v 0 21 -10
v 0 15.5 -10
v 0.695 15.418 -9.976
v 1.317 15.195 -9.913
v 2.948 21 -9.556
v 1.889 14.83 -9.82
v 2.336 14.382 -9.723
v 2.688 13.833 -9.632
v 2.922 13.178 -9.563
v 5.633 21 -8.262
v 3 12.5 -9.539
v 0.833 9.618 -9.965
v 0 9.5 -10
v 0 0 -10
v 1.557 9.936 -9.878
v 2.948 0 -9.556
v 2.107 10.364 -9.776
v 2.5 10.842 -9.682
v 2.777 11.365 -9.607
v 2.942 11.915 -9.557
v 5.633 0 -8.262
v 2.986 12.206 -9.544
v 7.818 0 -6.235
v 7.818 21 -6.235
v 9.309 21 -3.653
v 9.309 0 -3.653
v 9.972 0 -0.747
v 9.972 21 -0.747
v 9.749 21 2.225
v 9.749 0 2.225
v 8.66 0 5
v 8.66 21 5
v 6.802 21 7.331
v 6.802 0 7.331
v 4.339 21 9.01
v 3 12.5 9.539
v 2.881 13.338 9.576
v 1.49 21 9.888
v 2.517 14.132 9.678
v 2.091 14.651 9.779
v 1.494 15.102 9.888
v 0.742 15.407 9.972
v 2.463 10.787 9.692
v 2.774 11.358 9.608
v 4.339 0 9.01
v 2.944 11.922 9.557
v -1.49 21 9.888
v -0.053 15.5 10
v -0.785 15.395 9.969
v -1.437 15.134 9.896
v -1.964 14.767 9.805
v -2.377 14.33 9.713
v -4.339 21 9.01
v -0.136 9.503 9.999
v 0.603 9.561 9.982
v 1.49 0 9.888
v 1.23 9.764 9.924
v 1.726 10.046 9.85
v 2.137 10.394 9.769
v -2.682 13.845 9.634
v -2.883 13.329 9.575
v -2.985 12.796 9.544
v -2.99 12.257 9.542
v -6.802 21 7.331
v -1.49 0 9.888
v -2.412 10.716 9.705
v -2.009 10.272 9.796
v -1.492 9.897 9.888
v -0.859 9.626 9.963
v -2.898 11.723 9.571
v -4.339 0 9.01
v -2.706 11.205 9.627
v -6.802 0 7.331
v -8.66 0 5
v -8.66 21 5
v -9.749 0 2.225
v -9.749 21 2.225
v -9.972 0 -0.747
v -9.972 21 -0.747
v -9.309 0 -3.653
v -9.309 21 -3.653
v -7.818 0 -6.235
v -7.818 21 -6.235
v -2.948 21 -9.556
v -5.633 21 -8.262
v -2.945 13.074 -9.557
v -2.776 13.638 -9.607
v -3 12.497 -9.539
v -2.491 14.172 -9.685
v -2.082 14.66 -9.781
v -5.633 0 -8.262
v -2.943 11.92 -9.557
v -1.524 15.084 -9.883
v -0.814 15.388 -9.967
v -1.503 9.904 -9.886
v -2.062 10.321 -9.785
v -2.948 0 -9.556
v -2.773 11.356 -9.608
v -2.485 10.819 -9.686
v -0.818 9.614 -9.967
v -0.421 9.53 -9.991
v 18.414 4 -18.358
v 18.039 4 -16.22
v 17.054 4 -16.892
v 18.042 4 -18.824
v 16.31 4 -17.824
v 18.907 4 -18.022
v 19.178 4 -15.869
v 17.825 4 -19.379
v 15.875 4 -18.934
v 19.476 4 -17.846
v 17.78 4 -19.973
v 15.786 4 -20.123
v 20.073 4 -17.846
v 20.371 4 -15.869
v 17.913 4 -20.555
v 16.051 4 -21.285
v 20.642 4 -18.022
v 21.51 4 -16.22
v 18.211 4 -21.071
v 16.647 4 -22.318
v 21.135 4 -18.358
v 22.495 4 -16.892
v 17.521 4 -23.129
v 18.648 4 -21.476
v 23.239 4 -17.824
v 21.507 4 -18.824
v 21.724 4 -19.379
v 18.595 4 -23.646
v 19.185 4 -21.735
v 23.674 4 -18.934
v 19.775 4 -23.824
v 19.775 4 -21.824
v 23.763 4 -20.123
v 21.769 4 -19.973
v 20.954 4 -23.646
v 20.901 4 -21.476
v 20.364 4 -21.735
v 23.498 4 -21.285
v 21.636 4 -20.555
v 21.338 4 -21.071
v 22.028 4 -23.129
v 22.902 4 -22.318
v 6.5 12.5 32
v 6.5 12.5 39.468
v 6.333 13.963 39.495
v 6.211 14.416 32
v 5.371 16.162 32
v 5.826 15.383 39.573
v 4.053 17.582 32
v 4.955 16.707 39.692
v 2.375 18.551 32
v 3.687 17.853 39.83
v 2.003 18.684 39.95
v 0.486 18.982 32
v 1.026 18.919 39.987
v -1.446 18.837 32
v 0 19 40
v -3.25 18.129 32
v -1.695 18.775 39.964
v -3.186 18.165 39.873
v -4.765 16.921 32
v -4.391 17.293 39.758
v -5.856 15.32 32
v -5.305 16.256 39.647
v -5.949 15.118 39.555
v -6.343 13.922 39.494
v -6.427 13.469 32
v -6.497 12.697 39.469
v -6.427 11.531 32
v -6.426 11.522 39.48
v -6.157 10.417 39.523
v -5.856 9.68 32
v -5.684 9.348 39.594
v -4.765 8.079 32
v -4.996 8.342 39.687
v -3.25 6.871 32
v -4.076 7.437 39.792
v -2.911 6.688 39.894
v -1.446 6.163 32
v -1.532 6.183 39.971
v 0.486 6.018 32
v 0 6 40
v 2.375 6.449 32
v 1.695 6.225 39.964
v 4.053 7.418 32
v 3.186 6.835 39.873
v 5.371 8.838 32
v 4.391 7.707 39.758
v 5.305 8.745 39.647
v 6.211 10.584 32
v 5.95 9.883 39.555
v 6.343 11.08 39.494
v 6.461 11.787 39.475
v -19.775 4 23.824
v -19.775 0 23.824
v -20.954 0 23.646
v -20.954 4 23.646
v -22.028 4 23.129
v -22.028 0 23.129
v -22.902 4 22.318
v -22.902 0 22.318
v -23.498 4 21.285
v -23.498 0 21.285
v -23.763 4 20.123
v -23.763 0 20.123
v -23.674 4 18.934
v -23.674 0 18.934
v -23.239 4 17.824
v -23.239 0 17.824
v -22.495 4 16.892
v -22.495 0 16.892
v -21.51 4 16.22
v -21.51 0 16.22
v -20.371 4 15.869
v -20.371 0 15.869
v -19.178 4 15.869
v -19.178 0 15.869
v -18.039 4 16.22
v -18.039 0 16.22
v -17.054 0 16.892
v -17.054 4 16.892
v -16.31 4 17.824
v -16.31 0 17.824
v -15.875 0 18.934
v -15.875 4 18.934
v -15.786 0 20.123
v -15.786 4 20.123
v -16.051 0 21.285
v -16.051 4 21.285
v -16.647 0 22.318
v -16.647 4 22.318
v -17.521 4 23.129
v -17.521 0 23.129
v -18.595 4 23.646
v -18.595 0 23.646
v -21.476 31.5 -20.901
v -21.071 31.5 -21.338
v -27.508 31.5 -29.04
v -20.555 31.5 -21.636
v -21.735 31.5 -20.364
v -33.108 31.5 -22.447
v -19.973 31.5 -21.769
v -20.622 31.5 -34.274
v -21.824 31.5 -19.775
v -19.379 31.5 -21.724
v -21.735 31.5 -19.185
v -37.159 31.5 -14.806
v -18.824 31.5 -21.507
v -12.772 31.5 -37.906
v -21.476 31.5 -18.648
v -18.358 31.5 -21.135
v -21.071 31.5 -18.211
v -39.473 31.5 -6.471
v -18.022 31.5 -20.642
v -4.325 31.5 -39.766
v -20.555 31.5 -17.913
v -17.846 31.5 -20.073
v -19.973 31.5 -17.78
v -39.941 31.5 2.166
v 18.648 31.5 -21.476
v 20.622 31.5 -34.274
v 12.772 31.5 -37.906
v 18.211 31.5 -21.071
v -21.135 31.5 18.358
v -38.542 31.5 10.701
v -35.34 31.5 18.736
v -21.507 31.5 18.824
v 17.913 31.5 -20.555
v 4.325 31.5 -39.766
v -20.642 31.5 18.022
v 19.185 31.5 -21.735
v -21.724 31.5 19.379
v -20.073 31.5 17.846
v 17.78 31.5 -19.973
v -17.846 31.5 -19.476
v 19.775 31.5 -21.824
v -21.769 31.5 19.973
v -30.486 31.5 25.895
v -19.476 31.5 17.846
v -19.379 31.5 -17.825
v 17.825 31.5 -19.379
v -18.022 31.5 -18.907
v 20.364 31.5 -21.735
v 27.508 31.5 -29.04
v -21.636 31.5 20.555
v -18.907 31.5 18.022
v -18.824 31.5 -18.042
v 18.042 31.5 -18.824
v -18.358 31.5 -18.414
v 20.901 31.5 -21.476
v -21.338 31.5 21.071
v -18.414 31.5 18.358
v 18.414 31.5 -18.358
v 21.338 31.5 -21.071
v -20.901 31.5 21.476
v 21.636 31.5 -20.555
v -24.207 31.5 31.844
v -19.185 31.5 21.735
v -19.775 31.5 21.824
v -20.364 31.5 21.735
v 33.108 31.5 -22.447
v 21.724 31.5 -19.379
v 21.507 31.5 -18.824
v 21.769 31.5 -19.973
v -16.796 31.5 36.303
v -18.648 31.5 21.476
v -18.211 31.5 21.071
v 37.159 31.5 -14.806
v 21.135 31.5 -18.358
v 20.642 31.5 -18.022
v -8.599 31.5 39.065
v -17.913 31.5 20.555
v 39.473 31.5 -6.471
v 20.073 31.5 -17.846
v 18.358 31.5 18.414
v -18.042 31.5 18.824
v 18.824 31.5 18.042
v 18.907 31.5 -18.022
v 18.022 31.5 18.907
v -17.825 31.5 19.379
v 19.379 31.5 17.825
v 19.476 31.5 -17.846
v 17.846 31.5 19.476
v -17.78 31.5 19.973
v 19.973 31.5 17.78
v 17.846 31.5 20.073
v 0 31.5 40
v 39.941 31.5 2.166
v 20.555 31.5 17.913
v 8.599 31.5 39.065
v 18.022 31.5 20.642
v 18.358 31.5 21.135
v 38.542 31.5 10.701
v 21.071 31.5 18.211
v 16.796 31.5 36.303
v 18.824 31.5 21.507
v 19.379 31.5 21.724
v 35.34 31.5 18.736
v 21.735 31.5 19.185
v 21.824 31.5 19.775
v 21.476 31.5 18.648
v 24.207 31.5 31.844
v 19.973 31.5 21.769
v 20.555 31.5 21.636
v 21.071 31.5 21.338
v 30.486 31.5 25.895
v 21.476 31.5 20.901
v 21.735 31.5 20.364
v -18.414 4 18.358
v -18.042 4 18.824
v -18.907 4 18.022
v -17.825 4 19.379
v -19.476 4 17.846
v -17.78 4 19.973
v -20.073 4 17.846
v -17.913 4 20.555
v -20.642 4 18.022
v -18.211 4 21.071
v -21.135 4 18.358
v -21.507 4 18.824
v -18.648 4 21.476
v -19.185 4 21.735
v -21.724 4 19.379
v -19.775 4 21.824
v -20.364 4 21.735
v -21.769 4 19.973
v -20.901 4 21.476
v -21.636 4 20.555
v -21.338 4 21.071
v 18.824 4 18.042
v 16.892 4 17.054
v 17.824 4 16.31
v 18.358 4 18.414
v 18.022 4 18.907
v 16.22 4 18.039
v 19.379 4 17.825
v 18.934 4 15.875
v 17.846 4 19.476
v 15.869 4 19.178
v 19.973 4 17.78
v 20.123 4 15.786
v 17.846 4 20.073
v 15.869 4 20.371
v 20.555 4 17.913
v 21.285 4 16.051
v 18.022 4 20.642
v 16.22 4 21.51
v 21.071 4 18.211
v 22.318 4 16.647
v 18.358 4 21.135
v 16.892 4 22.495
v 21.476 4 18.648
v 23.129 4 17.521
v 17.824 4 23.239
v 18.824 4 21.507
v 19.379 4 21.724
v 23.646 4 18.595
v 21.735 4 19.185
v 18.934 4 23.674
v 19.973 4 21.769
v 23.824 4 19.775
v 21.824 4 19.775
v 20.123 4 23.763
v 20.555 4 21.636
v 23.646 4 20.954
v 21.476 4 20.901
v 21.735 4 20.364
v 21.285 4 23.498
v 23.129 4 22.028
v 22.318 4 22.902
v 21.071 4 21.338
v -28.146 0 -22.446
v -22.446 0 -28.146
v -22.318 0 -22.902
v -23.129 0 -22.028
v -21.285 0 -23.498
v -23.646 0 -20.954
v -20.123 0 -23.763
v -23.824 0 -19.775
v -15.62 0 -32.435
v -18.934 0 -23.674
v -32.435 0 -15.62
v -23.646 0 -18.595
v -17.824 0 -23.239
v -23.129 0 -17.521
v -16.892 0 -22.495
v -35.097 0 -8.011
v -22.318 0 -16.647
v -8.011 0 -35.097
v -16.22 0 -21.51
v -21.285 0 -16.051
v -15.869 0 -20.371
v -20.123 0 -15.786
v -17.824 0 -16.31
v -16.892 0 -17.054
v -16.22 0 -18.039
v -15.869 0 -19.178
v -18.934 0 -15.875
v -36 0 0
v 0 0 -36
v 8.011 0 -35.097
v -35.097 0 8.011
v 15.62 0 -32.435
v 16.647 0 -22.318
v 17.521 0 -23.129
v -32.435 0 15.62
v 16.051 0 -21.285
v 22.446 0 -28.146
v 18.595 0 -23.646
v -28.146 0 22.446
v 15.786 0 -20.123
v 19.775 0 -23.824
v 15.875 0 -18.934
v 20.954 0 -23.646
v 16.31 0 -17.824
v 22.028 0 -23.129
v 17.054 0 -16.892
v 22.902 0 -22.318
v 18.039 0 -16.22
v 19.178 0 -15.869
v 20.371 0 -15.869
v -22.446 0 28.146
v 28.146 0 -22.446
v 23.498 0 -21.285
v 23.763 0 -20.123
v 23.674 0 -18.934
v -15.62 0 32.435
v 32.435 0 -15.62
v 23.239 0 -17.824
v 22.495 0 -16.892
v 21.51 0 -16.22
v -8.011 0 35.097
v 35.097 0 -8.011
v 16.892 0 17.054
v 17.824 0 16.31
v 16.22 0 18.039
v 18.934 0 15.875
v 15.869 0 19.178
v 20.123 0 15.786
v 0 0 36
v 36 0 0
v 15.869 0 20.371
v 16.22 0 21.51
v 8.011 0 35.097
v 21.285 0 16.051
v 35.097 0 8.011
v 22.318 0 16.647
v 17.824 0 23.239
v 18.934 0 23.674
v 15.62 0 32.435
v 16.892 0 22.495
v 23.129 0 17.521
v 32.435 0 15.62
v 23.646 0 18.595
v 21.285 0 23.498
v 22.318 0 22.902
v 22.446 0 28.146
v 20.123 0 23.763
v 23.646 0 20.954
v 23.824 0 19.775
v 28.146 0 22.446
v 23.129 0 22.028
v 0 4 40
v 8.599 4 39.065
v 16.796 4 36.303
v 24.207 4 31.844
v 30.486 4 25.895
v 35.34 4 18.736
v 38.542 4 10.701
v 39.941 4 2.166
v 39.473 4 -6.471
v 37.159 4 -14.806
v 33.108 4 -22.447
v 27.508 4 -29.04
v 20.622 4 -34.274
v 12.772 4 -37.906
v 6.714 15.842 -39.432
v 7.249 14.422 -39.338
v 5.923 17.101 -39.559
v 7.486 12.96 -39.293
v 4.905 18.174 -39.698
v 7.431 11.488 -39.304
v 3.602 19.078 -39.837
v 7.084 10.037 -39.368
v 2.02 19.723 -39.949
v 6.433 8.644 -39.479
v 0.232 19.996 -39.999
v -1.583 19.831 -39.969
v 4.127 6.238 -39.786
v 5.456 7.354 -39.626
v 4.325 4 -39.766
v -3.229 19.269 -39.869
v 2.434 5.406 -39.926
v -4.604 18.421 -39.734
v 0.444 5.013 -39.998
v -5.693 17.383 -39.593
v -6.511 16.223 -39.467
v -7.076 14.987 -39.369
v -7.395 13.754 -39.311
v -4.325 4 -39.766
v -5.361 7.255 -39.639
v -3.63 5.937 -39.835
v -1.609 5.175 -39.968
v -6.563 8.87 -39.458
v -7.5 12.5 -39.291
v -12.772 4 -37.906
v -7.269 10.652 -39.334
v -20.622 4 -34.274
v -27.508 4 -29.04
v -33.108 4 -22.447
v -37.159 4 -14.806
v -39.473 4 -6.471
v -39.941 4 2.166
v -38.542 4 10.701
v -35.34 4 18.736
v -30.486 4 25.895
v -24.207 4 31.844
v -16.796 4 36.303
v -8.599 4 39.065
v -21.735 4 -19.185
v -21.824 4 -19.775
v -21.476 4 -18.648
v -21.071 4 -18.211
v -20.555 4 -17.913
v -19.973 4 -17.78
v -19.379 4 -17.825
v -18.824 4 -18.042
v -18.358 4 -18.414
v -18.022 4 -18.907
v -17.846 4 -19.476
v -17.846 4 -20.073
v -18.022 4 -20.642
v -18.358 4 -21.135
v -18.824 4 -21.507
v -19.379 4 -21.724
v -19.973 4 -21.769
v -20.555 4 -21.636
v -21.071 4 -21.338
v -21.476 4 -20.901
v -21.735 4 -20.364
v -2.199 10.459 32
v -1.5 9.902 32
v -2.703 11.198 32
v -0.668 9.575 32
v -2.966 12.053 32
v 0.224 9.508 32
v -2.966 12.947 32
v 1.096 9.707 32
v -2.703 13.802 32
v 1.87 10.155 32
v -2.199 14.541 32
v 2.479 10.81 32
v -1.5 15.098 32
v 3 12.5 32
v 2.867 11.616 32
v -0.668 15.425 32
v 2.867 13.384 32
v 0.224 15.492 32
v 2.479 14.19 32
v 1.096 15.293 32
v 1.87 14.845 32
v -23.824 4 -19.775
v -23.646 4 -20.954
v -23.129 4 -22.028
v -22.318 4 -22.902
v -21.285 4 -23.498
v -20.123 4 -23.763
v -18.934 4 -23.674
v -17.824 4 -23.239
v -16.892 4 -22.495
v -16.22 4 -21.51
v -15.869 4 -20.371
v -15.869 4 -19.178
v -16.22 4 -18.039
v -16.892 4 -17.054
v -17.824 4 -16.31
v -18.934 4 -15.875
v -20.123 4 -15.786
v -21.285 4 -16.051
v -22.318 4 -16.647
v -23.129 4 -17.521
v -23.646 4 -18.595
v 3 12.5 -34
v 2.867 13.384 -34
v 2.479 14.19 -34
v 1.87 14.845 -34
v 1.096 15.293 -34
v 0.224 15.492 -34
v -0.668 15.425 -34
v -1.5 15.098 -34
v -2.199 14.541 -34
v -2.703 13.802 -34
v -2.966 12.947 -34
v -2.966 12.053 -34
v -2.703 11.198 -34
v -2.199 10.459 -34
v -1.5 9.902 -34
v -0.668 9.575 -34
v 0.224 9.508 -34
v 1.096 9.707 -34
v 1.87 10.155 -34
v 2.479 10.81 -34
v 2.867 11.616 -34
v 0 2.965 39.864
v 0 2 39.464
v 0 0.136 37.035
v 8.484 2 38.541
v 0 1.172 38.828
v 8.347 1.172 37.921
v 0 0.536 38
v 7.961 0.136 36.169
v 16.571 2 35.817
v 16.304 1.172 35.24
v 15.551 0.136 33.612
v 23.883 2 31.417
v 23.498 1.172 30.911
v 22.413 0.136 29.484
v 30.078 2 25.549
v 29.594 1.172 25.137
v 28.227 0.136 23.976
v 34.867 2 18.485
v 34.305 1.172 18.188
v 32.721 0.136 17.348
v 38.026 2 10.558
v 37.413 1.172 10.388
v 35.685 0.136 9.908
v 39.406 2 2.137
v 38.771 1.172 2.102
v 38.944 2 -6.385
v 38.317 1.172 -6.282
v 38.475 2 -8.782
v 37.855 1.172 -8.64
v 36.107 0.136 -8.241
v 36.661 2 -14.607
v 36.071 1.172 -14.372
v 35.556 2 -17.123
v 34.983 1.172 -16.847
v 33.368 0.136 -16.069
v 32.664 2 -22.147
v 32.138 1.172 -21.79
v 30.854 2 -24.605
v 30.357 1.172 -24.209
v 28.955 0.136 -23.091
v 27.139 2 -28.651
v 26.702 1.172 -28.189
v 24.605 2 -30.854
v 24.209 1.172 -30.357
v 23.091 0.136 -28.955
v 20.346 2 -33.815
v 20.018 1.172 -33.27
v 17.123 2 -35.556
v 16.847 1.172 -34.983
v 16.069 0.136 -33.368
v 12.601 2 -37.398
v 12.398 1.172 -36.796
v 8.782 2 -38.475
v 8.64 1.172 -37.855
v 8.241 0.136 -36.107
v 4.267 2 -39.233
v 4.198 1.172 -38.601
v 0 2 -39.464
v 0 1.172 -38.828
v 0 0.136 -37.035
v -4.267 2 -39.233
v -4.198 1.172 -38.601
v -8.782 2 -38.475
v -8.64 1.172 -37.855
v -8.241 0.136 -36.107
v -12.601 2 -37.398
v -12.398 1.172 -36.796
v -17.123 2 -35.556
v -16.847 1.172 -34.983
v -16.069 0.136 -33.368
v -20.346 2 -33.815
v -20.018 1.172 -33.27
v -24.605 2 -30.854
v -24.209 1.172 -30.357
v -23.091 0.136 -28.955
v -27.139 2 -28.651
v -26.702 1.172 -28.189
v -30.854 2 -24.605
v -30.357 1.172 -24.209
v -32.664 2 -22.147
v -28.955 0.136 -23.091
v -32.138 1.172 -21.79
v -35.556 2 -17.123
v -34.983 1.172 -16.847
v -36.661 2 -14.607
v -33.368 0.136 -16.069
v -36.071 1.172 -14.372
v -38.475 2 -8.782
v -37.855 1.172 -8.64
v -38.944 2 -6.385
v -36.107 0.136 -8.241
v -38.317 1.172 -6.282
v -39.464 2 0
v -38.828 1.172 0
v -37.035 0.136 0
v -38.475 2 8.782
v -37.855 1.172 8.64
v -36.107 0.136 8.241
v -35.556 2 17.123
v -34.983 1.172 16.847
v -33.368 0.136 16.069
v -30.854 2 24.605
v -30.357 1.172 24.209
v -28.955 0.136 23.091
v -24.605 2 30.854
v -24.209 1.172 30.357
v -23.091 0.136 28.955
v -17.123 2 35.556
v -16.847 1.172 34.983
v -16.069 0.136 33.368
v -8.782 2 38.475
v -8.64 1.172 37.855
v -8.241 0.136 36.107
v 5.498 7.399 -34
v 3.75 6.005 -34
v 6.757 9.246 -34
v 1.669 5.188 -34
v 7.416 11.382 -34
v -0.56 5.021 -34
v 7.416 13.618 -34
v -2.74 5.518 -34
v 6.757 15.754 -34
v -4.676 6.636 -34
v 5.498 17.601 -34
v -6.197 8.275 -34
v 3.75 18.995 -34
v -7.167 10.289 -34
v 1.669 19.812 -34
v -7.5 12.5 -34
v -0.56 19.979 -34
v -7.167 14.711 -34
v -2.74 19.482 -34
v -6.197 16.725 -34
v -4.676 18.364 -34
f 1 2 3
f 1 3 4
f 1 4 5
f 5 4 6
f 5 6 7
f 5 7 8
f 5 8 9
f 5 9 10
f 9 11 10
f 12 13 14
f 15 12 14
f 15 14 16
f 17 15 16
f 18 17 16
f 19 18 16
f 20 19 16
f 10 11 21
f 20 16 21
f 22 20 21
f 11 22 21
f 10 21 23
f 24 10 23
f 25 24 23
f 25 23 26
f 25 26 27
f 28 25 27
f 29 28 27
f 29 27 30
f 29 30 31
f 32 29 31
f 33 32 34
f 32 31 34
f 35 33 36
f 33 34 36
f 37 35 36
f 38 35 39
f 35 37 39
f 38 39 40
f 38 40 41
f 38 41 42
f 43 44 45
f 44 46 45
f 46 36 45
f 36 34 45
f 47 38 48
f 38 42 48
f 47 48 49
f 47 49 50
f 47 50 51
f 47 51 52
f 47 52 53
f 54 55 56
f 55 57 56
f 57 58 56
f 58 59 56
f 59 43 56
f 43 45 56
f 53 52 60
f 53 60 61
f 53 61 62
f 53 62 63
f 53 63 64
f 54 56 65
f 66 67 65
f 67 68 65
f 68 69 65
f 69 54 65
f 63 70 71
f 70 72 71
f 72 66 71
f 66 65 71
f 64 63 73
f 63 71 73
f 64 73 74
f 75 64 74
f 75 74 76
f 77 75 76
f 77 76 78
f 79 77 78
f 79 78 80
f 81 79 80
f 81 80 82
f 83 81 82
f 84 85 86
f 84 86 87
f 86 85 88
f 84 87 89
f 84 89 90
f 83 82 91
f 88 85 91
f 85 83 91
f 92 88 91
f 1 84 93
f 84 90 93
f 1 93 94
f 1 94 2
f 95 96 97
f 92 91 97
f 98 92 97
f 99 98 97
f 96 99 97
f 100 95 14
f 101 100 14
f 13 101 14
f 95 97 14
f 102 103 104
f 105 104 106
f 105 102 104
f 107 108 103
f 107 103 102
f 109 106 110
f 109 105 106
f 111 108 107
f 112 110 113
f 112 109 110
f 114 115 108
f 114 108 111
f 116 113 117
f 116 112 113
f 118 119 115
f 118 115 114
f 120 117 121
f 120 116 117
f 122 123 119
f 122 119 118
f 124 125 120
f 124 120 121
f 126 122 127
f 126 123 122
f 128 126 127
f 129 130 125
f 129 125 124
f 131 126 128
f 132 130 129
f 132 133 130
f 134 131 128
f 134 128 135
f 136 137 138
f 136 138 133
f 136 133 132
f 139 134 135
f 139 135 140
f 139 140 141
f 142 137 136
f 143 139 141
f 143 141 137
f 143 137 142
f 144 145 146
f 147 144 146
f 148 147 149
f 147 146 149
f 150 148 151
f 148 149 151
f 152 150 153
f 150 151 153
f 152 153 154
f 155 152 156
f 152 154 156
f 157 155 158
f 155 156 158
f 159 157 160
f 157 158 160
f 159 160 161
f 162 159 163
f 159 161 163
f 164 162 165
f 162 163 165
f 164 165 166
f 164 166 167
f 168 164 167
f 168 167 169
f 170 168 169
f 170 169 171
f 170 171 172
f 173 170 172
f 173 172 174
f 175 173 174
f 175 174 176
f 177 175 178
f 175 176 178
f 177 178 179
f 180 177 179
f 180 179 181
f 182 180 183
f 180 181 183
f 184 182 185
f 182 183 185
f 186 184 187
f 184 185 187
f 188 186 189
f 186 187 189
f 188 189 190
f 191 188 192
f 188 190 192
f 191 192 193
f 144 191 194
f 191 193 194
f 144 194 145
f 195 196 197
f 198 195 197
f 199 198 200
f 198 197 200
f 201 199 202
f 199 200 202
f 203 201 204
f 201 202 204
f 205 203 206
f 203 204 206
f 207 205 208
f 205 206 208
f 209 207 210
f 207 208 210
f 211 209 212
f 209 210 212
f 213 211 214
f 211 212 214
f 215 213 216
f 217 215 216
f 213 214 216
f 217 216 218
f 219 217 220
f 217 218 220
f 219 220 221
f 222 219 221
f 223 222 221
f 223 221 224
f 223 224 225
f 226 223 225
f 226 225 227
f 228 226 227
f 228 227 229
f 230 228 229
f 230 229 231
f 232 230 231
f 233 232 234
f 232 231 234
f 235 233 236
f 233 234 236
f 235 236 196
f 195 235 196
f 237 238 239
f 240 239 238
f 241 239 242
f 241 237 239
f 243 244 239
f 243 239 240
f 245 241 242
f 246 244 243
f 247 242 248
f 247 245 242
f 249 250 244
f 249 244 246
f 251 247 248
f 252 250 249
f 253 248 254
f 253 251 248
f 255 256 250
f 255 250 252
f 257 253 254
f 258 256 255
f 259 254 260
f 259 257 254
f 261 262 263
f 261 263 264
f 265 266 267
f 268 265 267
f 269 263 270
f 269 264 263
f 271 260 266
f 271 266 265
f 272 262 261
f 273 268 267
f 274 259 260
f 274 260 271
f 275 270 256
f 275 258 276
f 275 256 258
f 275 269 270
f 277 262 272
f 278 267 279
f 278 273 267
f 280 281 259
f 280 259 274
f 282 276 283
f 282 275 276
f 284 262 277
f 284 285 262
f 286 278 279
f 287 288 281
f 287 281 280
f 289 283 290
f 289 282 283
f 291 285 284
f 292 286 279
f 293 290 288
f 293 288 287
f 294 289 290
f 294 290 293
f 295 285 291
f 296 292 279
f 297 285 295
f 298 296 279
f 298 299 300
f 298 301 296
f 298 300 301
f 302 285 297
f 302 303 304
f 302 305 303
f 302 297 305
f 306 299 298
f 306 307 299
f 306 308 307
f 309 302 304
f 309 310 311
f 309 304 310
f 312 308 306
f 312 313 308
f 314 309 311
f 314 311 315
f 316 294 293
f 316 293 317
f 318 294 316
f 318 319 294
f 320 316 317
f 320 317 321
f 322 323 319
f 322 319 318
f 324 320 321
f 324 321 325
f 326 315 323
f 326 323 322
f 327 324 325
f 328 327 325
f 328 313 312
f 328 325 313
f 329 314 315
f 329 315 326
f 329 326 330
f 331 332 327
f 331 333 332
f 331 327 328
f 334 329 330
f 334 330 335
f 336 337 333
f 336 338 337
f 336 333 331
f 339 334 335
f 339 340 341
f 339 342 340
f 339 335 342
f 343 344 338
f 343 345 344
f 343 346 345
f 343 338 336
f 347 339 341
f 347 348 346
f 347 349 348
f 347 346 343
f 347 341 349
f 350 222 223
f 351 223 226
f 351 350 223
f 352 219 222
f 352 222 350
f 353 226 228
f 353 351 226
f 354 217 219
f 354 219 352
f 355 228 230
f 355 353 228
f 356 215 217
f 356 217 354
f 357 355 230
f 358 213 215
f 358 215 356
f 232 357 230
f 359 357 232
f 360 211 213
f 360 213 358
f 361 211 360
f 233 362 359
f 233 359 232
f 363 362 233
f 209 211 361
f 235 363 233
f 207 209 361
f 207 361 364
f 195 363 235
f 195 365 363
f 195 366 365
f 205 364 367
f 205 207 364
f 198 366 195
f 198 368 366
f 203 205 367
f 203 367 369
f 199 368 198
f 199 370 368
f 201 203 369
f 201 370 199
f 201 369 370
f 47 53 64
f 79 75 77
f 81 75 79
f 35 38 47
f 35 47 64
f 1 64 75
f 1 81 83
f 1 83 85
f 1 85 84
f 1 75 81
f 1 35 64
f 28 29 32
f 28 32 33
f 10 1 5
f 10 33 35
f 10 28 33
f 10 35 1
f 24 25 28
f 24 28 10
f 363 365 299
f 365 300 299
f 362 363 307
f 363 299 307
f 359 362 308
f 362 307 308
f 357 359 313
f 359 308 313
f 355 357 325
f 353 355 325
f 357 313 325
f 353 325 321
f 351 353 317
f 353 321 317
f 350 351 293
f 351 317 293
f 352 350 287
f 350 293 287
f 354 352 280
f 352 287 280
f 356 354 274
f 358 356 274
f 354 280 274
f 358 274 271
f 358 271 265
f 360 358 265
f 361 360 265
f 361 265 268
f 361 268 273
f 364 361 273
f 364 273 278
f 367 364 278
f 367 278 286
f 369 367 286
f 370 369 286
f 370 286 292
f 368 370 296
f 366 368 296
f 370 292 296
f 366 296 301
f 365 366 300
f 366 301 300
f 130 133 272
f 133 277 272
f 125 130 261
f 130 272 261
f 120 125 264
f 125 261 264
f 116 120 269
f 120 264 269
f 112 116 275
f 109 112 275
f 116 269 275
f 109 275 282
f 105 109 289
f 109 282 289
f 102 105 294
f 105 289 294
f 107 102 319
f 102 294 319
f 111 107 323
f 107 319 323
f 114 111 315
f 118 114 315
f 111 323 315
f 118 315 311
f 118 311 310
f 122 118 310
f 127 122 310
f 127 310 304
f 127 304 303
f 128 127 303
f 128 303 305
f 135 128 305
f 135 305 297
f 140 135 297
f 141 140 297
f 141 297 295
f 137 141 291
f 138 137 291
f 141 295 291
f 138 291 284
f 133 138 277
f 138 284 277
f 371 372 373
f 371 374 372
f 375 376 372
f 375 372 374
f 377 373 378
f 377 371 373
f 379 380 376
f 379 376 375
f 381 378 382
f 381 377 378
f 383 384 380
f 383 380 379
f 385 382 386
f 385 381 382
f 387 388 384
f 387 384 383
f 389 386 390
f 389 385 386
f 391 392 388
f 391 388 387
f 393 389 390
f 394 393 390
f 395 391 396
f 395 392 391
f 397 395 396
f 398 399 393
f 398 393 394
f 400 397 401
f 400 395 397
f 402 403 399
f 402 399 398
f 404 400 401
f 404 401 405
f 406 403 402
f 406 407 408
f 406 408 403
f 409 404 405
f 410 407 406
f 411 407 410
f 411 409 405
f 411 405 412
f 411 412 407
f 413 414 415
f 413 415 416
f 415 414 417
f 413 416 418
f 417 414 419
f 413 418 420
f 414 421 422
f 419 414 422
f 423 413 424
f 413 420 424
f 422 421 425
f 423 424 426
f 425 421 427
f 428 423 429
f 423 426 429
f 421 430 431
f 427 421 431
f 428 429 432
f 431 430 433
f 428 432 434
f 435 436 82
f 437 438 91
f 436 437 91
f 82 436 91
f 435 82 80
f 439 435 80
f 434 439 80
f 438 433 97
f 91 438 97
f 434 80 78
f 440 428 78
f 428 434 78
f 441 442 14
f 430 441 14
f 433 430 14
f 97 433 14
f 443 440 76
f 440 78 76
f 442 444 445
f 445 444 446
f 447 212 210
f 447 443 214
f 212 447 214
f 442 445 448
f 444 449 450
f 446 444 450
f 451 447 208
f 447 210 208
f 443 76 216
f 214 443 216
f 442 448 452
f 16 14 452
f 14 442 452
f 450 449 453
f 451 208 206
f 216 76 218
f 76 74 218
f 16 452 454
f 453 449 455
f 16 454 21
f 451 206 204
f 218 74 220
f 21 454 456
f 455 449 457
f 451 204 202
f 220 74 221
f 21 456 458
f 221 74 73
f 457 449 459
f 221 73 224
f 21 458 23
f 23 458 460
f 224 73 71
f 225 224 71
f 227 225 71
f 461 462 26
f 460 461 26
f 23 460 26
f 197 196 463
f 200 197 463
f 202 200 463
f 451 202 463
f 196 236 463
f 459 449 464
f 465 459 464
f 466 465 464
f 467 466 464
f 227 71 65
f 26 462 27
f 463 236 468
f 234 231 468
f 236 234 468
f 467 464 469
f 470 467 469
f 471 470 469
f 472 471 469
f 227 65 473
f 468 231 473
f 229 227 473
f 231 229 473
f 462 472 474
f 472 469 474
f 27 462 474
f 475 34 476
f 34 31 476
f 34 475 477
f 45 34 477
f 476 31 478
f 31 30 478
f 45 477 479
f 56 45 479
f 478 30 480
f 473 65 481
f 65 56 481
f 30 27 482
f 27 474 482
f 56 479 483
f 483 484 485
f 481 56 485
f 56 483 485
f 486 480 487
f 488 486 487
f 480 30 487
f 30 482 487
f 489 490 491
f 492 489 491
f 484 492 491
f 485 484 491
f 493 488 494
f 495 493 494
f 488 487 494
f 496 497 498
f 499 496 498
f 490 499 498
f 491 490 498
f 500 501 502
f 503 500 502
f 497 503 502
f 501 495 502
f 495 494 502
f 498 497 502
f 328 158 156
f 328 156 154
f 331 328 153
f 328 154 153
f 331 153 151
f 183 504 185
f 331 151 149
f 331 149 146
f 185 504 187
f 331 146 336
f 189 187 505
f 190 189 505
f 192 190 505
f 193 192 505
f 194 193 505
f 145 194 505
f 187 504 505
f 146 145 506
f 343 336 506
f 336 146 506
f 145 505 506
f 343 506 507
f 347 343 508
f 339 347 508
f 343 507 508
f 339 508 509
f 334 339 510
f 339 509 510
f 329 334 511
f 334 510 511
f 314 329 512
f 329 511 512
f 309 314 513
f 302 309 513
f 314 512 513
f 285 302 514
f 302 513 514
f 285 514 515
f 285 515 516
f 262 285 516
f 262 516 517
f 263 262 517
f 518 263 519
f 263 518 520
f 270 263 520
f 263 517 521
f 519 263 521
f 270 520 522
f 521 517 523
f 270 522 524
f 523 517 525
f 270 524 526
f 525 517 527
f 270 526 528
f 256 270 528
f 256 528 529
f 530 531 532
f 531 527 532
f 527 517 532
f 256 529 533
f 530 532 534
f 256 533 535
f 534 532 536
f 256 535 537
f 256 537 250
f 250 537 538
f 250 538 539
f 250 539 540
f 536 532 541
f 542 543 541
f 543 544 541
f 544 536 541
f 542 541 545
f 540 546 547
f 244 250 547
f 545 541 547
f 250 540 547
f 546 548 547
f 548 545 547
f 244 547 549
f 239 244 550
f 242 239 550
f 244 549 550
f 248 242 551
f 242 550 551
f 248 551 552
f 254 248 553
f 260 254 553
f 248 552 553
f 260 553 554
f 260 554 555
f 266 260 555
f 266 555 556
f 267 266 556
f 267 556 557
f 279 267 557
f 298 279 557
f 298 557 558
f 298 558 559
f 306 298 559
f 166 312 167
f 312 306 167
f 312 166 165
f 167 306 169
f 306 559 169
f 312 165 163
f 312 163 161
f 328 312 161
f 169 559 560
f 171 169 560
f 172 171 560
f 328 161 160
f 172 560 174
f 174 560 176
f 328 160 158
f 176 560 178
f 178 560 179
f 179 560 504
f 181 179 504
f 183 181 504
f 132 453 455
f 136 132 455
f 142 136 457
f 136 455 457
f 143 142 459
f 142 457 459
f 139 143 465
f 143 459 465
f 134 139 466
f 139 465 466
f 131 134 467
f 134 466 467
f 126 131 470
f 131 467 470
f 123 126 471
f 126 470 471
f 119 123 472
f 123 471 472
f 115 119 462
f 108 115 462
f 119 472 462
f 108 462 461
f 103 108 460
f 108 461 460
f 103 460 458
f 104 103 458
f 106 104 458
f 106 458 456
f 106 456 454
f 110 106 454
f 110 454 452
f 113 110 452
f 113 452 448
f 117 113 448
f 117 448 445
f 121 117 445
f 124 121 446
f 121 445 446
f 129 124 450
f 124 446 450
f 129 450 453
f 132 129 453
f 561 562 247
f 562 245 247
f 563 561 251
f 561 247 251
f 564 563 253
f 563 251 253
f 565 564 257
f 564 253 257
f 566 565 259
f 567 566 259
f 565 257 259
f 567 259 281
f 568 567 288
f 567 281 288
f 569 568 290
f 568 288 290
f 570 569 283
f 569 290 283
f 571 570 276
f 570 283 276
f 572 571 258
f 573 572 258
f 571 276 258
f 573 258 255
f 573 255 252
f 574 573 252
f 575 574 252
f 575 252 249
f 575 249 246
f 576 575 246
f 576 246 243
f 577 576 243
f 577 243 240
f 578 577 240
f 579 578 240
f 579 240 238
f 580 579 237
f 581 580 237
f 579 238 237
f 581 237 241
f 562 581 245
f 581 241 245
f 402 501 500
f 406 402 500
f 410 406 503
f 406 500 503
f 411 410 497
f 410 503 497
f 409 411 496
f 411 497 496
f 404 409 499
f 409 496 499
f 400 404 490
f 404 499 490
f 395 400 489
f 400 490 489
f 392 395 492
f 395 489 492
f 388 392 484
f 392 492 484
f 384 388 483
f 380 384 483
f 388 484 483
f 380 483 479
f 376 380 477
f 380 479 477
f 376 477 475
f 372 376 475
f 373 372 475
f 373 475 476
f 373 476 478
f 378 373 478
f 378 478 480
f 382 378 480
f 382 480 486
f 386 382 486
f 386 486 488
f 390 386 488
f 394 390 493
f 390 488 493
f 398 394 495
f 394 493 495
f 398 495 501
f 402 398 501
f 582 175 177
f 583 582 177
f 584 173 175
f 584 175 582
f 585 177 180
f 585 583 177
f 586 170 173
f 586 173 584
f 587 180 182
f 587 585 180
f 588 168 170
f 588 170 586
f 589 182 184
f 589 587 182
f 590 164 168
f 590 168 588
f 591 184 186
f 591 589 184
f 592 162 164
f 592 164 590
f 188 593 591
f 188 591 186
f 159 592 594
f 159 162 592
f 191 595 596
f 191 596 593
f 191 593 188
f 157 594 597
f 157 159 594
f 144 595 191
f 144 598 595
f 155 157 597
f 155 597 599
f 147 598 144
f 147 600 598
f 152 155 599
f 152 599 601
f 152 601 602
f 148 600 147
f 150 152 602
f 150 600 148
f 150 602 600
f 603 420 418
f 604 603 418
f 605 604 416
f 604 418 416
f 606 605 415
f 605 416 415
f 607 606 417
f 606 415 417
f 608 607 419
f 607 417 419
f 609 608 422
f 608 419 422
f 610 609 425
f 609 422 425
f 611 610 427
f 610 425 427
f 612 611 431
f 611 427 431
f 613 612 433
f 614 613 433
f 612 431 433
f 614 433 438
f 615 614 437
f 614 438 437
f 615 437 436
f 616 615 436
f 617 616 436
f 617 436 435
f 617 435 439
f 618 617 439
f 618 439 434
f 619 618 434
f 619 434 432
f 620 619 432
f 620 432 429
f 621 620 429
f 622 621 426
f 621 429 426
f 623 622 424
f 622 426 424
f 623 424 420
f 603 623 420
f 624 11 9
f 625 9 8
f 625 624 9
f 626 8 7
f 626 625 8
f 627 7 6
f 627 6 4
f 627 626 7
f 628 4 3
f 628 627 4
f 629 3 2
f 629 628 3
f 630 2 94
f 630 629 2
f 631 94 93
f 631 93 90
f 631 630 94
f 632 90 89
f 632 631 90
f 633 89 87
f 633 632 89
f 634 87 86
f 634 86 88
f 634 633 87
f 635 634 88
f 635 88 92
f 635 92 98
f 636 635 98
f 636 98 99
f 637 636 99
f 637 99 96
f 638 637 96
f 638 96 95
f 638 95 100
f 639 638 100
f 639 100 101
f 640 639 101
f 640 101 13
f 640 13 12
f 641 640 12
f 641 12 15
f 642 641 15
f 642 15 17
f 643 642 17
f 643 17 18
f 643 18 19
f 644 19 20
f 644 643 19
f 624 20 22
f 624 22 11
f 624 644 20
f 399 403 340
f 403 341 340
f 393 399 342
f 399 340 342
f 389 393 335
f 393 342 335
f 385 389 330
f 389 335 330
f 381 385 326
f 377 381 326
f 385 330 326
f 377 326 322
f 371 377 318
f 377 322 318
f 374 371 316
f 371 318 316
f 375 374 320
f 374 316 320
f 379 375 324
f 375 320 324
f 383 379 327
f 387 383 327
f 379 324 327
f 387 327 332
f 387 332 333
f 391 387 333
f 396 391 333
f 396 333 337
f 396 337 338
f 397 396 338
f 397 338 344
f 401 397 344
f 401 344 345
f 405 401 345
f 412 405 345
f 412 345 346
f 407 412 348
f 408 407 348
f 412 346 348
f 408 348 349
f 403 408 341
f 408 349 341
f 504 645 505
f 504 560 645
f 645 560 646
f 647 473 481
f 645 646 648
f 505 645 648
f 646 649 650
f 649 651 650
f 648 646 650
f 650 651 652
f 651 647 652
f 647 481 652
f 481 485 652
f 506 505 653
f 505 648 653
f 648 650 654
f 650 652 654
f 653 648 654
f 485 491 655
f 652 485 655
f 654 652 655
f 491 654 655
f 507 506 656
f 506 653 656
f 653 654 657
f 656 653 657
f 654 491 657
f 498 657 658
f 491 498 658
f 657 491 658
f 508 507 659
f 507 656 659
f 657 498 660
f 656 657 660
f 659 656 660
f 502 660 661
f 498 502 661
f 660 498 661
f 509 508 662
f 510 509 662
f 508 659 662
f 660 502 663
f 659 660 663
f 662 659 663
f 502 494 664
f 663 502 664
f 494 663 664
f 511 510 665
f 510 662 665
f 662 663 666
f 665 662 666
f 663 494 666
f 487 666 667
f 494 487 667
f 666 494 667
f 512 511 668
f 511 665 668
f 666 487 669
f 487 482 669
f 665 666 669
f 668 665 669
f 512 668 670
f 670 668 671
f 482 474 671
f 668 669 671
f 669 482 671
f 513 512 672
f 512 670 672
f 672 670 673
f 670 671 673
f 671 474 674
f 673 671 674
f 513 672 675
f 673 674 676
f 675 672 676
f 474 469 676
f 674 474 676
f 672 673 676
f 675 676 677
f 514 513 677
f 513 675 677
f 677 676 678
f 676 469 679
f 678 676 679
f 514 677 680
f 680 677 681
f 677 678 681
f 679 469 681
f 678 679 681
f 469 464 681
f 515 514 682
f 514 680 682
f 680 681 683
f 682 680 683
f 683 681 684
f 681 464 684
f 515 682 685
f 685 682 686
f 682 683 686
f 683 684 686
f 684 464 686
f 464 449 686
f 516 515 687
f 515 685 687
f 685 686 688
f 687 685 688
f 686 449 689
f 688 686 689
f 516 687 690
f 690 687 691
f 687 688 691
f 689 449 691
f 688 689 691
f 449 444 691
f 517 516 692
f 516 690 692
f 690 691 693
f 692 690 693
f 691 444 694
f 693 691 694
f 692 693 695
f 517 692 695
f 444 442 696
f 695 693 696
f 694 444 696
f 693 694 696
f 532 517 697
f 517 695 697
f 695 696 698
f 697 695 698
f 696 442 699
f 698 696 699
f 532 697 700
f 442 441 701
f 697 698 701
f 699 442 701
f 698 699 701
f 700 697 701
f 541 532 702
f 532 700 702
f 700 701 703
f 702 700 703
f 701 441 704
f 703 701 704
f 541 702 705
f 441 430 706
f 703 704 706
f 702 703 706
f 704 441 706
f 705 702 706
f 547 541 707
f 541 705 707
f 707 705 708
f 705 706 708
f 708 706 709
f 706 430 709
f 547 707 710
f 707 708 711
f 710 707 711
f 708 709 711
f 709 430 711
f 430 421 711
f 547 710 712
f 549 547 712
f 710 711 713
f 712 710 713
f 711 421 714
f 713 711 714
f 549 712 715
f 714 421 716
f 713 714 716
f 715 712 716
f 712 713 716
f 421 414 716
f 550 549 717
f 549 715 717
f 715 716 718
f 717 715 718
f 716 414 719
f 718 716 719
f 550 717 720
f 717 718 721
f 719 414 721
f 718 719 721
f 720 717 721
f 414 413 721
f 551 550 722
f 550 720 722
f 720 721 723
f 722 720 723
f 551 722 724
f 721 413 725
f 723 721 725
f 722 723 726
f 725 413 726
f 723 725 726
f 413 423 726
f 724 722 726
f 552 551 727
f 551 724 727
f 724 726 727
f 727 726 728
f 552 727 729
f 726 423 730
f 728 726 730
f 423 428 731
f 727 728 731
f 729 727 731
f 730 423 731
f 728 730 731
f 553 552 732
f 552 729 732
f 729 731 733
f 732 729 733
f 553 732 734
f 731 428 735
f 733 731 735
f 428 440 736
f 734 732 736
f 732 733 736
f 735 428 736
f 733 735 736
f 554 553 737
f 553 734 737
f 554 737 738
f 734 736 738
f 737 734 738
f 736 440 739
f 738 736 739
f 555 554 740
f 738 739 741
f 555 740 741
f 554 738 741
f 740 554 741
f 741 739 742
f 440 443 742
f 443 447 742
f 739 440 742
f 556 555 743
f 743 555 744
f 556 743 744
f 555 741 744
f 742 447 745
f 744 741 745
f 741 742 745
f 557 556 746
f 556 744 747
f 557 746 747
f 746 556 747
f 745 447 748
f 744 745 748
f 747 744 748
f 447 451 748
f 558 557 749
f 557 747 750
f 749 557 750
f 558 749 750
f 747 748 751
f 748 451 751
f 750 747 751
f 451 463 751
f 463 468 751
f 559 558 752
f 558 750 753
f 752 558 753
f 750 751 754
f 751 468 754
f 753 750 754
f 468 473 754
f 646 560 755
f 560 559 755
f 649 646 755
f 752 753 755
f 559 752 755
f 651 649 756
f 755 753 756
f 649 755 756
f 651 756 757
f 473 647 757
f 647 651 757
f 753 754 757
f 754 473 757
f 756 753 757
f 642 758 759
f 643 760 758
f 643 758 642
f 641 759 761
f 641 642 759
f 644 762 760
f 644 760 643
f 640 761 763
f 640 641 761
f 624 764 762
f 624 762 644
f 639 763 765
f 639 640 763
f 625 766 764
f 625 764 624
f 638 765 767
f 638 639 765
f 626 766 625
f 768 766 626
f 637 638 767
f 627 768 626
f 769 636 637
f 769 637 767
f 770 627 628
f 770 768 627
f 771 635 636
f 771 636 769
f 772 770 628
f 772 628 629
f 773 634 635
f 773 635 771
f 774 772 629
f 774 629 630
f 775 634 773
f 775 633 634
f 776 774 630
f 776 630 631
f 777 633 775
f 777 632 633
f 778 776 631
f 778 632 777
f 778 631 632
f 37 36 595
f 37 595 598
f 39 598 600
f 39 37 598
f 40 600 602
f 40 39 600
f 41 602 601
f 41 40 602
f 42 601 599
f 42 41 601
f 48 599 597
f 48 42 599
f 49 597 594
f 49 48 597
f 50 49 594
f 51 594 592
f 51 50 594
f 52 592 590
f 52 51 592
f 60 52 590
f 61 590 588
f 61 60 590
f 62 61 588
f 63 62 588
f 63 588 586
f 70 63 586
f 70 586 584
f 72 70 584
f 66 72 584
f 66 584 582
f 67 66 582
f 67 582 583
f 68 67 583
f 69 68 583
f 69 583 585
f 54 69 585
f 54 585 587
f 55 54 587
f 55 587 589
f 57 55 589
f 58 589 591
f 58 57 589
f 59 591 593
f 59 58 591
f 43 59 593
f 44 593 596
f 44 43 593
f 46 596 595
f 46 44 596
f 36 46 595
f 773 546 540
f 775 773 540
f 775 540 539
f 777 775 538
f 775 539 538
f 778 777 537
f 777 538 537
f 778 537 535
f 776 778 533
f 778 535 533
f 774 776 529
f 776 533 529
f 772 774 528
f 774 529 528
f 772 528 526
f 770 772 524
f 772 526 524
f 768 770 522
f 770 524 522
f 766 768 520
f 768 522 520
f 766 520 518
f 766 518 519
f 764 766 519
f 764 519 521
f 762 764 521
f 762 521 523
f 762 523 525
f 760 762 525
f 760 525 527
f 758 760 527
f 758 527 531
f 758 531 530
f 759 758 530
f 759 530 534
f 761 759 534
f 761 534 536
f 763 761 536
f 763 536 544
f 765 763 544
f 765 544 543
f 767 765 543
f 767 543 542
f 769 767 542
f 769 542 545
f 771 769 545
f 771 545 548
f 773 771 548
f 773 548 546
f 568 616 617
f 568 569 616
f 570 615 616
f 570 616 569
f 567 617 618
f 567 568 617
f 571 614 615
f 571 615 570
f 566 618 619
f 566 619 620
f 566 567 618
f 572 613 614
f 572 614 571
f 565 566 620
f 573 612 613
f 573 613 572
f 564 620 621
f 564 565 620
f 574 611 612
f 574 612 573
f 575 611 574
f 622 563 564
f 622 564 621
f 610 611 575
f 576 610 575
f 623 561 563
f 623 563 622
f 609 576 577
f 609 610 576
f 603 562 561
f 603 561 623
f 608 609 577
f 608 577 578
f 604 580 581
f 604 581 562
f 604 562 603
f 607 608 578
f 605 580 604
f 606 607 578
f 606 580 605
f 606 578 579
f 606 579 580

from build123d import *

# Parameters (mm, degrees)
SKETCH1_R               = 40
BOSS_EXTRUDE1_DEPTH     = 31.5
CUT_EXTRUDE1_DEPTH      = 65.747586828
CUT_EXTRUDE1_DEPTH_BACK = 65.747586828
SKETCH2_R               = 3
SKETCH7_R               = 10
CUT_EXTRUDE3_DEPTH      = 21
SKETCH8_R               = 6.5
CUT_EXTRUDE4_DEPTH      = 8
SKETCH9_R               = 7.5
CUT_EXTRUDE5_DEPTH      = 6
SKETCH10_R              = 2
CUT_EXTRUDE7_DEPTH      = 65.747587
CIRPATTERN1_COUNT       = 4
SKETCH12_R              = 4
CUT_EXTRUDE8_DEPTH      = 4
CIRPATTERN2_COUNT       = 4
FILLET1_R               = 4


with BuildPart() as part:
    # Sketch1 → Boss-Extrude1 (new body)
    with BuildSketch(Plane(origin=(0, 0, 0), x_dir=(1, 0, 0), z_dir=(0, 1, 0))):
        with Locations(Location((0, 0, 0), (0, 0, 270))):
            Circle(SKETCH1_R)
    extrude(amount=BOSS_EXTRUDE1_DEPTH)

    # Sketch2 → Cut-Extrude1 (cut, two sides: drawn at the far end of the back side and taken through both)
    with BuildSketch(Plane.XY.offset(-CUT_EXTRUDE1_DEPTH_BACK)):
        with Locations((0, 12.5)):
            Circle(SKETCH2_R)
    extrude(amount=CUT_EXTRUDE1_DEPTH + CUT_EXTRUDE1_DEPTH_BACK, mode=Mode.SUBTRACT)

    # Sketch7 → Cut-Extrude3 (cut)
    with BuildSketch(Plane.XZ):
        with Locations(Location((0, 0, 0), (0, 0, 270))):
            Circle(SKETCH7_R)
    extrude(amount=-CUT_EXTRUDE3_DEPTH, mode=Mode.SUBTRACT)

    # Sketch8 → Cut-Extrude4 (cut)
    with BuildSketch(Plane.XY.offset(40)):
        with Locations((0, 12.5)):
            Circle(SKETCH8_R)
    extrude(amount=-CUT_EXTRUDE4_DEPTH, mode=Mode.SUBTRACT)

    # Sketch9 → Cut-Extrude5 (cut)
    with BuildSketch(Plane(origin=(0, 0, -40), x_dir=(-1, 0, 0), z_dir=(0, 0, -1))):
        with Locations((0, 12.5)):
            Circle(SKETCH9_R)
    extrude(amount=-CUT_EXTRUDE5_DEPTH, mode=Mode.SUBTRACT)

    # Sketch10 → Cut-Extrude7 (cut, symmetric)
    with BuildSketch(Plane(origin=(0, 31.5, 0), x_dir=(1, 0, 0), z_dir=(0, 1, 0))):
        with Locations(Location((-19.774516002, -19.823894806, 0), (0, 0, 270))):
            Circle(SKETCH10_R)
    cut_extrude7 = extrude(amount=CUT_EXTRUDE7_DEPTH, both=True, mode=Mode.SUBTRACT)

    # CirPattern1: Cut-Extrude7 ×4 about axis
    cirpattern1_axis = Axis((0, 0, 0), (0, 1, 0))
    for i in range(1, CIRPATTERN1_COUNT):
        add(cut_extrude7.rotate(cirpattern1_axis, i * 360 / CIRPATTERN1_COUNT), mode=Mode.SUBTRACT)

    # Sketch12 → Cut-Extrude8 (cut)
    with BuildSketch(Plane(origin=(0, 0, 0), x_dir=(-1, 0, 0), z_dir=(0, -1, 0))):
        with Locations(Location((-19.774516002, 19.823894806, 0), (0, 0, 90))):
            Circle(SKETCH12_R)
    cut_extrude8 = extrude(amount=-CUT_EXTRUDE8_DEPTH, mode=Mode.SUBTRACT)

    # CirPattern2: Cut-Extrude8 ×4 about axis
    cirpattern2_axis = Axis((0, 0, 0), (0, 1, 0))
    for i in range(1, CIRPATTERN2_COUNT):
        add(cut_extrude8.rotate(cirpattern2_axis, i * 360 / CIRPATTERN2_COUNT), mode=Mode.SUBTRACT)

    # Fillet1
    fillet1_edges = [part.edges().sort_by_distance(p)[0] for p in [
        (0, 0, -40),
    ]]
    fillet(fillet1_edges, radius=FILLET1_R)


solid = part.part
